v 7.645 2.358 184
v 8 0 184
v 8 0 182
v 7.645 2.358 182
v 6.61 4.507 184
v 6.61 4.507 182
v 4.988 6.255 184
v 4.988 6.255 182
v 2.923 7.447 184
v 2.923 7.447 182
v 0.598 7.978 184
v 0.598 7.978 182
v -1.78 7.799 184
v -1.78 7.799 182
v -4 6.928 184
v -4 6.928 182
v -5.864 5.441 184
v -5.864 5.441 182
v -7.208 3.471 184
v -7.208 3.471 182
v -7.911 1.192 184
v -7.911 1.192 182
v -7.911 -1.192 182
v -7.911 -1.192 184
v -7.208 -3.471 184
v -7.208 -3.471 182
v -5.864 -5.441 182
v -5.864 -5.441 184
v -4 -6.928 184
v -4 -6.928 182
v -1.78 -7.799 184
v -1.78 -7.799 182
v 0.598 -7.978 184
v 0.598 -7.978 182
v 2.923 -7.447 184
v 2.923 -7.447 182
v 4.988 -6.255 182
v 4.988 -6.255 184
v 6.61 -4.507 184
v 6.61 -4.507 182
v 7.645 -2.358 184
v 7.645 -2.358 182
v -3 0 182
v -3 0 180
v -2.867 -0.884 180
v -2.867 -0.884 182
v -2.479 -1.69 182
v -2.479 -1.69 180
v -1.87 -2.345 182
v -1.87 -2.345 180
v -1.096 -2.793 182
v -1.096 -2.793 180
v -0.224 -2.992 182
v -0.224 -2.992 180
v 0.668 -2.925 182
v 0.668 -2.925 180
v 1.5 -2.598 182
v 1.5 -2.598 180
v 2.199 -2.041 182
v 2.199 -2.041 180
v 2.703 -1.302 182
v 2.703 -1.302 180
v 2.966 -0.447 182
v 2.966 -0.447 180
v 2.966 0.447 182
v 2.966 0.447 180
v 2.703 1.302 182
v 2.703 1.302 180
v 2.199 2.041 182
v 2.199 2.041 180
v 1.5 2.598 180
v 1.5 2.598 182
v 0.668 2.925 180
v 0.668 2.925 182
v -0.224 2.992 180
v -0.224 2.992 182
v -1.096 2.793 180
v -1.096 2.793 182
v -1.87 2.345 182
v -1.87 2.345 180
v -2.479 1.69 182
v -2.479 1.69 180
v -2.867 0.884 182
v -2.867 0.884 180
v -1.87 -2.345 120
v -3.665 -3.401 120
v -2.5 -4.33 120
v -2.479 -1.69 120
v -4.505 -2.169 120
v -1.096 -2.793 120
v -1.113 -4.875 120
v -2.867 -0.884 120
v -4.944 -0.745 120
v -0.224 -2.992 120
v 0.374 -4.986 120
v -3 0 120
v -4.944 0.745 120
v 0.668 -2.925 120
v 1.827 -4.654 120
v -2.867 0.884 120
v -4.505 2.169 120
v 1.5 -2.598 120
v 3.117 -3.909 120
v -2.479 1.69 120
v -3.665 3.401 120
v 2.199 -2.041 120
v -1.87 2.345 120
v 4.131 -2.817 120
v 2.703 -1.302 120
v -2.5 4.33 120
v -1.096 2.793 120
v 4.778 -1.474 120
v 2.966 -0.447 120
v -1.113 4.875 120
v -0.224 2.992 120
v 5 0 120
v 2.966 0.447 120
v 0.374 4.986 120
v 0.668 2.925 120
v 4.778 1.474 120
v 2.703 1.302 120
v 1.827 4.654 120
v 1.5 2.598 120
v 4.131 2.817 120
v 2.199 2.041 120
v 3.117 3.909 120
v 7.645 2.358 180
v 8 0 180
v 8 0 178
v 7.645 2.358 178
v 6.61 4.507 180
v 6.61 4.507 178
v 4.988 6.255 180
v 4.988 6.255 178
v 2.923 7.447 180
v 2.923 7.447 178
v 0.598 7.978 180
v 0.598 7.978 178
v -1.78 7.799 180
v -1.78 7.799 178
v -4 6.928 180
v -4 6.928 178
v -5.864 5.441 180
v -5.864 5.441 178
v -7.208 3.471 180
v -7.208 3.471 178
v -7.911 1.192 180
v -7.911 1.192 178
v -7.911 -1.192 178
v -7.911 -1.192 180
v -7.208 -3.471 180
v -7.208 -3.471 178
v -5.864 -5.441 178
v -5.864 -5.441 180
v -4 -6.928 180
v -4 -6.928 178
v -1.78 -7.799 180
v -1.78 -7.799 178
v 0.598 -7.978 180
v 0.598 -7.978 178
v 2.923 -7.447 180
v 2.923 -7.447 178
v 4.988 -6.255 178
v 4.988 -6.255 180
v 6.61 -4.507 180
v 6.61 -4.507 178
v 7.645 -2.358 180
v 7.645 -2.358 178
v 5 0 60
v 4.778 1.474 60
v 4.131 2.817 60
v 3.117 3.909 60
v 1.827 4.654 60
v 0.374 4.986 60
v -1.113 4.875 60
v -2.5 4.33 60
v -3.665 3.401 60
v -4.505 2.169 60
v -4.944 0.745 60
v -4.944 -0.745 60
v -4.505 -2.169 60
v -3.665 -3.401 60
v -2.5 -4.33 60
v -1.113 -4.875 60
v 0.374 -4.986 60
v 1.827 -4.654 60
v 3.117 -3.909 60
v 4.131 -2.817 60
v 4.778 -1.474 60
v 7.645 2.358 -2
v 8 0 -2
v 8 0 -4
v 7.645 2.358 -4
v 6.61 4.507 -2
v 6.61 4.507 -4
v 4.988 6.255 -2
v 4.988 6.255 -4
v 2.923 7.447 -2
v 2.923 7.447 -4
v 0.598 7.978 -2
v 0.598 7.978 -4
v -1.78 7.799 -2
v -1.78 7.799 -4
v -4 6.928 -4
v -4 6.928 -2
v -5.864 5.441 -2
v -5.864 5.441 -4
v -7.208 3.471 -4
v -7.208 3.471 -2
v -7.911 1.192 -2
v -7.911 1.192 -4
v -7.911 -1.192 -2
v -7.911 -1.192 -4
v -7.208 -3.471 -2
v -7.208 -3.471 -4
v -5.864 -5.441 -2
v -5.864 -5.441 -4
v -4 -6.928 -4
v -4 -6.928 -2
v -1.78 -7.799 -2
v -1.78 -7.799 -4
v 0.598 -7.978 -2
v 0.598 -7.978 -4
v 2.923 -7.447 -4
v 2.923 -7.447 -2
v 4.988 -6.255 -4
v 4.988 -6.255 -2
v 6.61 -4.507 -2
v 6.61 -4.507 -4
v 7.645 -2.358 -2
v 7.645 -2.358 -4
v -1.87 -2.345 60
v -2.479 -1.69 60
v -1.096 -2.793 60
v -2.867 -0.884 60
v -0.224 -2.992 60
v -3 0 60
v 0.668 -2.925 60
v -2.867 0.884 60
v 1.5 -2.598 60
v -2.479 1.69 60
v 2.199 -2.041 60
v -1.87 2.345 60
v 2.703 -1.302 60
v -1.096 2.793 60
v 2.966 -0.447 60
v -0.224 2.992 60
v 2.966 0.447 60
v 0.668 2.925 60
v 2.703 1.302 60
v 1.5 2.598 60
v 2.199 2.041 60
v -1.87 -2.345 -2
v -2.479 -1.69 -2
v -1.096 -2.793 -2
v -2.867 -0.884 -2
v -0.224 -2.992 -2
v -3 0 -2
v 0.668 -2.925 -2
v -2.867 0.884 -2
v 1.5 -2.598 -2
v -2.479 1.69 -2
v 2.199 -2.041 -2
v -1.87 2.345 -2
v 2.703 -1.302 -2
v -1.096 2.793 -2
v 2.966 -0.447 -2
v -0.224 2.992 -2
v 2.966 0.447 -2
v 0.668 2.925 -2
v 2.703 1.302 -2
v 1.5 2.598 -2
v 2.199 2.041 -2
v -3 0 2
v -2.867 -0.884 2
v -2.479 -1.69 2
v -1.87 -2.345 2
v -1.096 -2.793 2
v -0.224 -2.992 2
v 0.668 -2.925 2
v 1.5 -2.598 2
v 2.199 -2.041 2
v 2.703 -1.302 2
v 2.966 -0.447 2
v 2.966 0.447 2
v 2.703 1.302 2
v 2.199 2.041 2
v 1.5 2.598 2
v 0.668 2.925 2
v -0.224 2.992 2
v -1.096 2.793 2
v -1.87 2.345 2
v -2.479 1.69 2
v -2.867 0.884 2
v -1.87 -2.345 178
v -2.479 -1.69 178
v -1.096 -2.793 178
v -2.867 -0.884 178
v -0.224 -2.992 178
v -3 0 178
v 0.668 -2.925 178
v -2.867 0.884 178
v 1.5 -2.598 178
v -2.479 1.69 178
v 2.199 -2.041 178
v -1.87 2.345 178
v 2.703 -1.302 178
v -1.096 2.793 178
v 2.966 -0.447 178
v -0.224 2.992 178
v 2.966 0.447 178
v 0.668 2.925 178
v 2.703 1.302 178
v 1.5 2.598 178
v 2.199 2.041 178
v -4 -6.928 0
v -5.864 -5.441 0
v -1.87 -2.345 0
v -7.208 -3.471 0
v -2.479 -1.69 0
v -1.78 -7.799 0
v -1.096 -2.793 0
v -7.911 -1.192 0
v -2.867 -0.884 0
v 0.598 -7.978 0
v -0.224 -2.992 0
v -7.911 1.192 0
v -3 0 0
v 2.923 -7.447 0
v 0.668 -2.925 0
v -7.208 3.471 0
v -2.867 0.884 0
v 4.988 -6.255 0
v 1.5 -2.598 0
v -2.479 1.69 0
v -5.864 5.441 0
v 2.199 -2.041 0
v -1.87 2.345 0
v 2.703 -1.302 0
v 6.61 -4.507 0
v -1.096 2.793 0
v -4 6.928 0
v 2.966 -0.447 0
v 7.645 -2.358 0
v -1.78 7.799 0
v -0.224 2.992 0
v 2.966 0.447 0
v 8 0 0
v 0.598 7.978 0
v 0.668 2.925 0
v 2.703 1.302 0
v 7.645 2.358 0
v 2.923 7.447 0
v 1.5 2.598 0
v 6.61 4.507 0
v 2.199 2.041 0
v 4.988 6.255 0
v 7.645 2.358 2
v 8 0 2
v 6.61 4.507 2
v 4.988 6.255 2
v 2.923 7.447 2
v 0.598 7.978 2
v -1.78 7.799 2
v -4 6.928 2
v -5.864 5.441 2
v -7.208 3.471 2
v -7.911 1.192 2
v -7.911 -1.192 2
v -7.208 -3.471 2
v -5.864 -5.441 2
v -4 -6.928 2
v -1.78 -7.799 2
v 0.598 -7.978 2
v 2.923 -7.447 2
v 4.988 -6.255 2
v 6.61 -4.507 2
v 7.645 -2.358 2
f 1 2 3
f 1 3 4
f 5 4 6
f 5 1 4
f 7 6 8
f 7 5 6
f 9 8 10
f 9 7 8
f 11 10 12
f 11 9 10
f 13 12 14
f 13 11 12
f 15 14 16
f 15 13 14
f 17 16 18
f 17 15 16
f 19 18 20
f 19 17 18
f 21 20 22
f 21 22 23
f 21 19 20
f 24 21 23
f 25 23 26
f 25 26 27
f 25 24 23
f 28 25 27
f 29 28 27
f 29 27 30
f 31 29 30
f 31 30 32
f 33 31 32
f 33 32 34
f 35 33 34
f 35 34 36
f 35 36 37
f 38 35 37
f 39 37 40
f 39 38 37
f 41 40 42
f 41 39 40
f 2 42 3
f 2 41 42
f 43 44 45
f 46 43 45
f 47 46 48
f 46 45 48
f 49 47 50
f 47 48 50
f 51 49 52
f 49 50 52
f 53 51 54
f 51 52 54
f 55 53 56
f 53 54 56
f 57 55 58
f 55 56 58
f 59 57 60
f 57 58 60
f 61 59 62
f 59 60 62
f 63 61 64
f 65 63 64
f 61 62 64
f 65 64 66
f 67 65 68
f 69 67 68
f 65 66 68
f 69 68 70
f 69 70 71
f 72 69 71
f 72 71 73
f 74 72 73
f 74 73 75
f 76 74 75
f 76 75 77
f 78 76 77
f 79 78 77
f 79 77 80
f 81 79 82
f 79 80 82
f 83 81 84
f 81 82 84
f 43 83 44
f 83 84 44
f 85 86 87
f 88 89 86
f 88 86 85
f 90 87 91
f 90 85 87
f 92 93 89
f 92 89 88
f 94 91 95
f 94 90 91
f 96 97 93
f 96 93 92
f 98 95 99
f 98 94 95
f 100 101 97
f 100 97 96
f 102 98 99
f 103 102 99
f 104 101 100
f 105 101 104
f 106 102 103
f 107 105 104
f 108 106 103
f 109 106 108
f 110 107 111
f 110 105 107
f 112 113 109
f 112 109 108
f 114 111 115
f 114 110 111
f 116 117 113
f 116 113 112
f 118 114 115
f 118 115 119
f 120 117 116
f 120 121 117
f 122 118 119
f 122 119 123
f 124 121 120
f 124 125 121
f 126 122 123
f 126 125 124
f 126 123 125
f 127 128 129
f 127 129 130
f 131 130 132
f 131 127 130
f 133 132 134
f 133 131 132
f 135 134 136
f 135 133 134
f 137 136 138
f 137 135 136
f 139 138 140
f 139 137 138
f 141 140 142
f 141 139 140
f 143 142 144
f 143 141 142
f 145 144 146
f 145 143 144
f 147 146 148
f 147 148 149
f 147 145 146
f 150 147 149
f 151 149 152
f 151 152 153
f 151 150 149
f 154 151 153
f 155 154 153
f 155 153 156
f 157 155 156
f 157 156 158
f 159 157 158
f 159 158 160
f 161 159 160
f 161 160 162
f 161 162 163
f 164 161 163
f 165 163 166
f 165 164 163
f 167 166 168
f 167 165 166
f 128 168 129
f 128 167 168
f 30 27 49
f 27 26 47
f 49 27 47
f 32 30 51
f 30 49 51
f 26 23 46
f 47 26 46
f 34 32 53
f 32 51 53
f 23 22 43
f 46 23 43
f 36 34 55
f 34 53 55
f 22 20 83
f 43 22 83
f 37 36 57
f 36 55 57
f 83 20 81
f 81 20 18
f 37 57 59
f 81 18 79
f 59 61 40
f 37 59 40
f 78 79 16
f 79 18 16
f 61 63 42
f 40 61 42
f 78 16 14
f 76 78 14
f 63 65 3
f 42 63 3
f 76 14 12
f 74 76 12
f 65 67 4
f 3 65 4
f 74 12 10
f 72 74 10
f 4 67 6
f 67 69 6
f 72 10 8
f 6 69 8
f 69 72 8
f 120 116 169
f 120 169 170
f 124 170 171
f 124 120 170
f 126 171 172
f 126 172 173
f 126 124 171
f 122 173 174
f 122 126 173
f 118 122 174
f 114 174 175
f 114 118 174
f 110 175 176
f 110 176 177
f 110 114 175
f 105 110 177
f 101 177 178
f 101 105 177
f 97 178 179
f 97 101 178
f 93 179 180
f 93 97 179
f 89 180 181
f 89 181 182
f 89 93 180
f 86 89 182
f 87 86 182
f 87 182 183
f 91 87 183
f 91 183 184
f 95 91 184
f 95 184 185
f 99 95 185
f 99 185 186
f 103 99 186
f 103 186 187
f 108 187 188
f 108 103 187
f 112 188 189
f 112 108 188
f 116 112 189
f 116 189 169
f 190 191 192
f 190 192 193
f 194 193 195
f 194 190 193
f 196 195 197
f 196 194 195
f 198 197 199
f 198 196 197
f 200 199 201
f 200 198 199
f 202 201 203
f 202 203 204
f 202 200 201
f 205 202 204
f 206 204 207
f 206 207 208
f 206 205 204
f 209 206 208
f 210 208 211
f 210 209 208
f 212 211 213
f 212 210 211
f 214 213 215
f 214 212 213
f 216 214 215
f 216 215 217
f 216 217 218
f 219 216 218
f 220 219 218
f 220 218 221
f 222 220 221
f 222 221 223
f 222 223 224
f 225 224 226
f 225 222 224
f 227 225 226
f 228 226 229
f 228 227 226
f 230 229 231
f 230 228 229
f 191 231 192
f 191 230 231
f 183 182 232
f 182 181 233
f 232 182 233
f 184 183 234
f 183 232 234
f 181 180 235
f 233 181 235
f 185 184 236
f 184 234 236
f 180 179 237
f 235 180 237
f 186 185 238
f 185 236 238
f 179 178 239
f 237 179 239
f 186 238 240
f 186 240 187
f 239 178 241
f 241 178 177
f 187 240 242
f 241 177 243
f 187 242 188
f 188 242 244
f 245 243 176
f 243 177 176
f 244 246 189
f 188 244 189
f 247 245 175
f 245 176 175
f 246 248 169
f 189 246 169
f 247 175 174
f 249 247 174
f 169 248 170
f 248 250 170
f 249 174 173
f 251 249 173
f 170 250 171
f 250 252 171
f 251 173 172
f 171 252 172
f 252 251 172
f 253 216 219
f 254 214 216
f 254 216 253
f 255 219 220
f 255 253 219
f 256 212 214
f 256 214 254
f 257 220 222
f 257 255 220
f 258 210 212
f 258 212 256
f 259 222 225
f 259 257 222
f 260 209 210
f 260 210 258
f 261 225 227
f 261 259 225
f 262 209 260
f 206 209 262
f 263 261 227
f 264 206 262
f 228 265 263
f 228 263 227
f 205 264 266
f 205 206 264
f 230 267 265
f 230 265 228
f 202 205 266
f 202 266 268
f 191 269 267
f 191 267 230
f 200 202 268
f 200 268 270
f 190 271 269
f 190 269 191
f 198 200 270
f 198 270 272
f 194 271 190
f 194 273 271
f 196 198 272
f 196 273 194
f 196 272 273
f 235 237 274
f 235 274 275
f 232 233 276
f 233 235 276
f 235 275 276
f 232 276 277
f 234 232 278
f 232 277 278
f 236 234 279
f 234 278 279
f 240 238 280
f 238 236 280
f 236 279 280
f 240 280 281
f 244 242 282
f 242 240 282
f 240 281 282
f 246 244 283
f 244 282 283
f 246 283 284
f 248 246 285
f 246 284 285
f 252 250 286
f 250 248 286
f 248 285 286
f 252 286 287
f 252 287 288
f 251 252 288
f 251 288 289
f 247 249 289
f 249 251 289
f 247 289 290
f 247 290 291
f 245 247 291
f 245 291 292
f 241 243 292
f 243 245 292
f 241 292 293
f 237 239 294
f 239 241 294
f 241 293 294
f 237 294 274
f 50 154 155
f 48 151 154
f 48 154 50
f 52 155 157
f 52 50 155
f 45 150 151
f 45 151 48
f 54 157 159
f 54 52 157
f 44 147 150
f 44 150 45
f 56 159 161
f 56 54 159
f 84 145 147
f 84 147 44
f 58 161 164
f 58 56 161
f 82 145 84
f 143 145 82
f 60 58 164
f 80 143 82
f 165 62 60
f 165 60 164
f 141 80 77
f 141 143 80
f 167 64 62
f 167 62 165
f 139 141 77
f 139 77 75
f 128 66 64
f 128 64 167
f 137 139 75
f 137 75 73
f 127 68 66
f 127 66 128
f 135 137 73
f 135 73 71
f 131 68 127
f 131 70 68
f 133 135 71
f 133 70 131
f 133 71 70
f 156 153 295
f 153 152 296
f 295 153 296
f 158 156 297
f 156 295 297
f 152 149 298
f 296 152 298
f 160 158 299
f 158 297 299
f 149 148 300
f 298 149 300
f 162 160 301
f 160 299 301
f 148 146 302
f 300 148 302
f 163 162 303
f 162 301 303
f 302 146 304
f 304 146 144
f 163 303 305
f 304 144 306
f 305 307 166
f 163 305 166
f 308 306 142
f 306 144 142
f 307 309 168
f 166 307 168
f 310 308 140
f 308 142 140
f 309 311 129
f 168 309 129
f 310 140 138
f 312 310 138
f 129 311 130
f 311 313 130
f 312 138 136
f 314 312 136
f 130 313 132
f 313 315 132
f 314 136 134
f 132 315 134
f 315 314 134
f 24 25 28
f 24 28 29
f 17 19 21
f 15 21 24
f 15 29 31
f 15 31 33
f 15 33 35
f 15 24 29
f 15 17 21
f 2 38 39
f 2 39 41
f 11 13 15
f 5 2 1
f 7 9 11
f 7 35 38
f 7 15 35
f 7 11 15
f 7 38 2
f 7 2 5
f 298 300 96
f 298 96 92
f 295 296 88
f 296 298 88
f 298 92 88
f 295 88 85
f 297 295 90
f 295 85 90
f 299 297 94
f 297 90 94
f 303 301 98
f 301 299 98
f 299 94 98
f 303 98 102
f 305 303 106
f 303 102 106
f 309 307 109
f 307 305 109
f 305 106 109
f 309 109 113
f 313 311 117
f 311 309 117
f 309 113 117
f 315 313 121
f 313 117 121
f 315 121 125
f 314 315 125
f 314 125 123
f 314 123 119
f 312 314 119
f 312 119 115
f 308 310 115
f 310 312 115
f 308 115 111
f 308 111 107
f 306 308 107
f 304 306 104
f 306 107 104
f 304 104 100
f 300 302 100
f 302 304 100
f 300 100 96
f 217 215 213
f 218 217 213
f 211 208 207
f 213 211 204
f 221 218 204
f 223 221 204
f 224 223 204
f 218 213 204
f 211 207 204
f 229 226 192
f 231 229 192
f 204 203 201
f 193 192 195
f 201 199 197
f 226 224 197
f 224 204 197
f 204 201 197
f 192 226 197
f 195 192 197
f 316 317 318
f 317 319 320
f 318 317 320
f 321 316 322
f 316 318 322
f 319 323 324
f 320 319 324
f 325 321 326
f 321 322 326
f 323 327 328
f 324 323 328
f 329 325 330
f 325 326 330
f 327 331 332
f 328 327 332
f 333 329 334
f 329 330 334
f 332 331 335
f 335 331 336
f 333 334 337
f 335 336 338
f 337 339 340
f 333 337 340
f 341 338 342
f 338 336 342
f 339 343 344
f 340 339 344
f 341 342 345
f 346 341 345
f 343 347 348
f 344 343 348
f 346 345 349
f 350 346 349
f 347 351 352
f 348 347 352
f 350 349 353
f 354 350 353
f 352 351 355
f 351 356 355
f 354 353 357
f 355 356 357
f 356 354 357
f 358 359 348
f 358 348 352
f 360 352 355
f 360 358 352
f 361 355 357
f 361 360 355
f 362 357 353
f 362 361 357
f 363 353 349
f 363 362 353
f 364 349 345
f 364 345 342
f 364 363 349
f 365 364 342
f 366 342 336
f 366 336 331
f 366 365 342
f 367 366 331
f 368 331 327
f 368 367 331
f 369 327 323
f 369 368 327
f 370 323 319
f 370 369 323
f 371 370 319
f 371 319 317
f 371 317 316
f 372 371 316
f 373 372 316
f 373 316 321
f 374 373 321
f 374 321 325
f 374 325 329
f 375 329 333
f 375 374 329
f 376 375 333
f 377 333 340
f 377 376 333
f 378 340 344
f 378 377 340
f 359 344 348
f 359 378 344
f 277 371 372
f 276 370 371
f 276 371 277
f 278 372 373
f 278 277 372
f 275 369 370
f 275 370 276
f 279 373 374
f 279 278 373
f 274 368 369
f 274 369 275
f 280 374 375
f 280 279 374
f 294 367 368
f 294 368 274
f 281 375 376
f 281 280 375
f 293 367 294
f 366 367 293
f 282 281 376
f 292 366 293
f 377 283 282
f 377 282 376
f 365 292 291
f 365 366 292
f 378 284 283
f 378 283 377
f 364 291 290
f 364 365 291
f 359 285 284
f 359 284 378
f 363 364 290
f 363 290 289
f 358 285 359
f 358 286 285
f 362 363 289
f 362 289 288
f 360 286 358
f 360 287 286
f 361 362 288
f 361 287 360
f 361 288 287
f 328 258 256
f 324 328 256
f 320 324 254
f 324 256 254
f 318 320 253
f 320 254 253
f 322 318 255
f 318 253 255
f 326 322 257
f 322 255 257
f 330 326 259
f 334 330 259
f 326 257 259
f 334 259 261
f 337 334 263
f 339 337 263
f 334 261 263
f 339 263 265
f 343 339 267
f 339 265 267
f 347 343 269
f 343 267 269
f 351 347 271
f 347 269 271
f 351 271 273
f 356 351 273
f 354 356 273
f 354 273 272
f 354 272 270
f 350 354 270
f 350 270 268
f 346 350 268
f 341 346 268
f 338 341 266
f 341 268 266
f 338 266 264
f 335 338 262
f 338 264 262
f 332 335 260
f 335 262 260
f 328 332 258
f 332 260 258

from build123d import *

# Parameters (mm, degrees)
SKETCH_1_R       = 3
EXTRUDE_1_DEPTH  = 180
SKETCH_2_R       = 8
EXTRUDE_2_DEPTH  = 2
EXTRUDE_START    = -178
SKETCH_2_2_R     = 8
EXTRUDE_3_DEPTH  = 2
EXTRUDE_START_2  = -2
SKETCH_1_2_R     = 3
EXTRUDE_4_DEPTH  = 2
EXTRUDE_START_3  = 180
SKETCH_1_3_R     = 3
EXTRUDE_5_DEPTH  = 2
EXTRUDE_START_4  = 4
SKETCH_2_3_R     = 8
EXTRUDE_6_DEPTH  = 2
EXTRUDE_START_5  = -182
SKETCH_2_4_R     = 8
EXTRUDE_7_DEPTH  = 2
EXTRUDE_START_6  = -64
SKETCH_3_R       = 5
EXTRUDE_10_DEPTH = 60


with BuildPart() as part:
    # 草图1 → 凸台-拉伸1 (new body)
    with BuildSketch(Plane.XY):
        with Locations(Location((0, 0, 0), (0, 0, 180))):
            Circle(SKETCH_1_R)
    extrude(amount=EXTRUDE_1_DEPTH)

    # 草图2 → 凸台-拉伸2 (add)
    with BuildSketch(Plane.XY.offset(180)):
        Circle(SKETCH_2_R)
    extrude(amount=-EXTRUDE_2_DEPTH)

    # 草图2<2> → 凸台-拉伸3 (add)
    with BuildSketch(Plane.XY.offset(180).offset(EXTRUDE_START)):
        Circle(SKETCH_2_2_R)
    extrude(amount=-EXTRUDE_3_DEPTH)

    # 草图1<2> → 凸台-拉伸4 (add)
    with BuildSketch(Plane.XY.offset(EXTRUDE_START_2)):
        with Locations(Location((0, 0, 0), (0, 0, 180))):
            Circle(SKETCH_1_2_R)
    extrude(amount=EXTRUDE_4_DEPTH)

    # 草图1<3> → 凸台-拉伸5 (add)
    with BuildSketch(Plane.XY.offset(EXTRUDE_START_3)):
        with Locations(Location((0, 0, 0), (0, 0, 180))):
            Circle(SKETCH_1_3_R)
    extrude(amount=EXTRUDE_5_DEPTH)

    # 草图2<3> → 凸台-拉伸6 (add)
    with BuildSketch(Plane.XY.offset(180).offset(EXTRUDE_START_4)):
        Circle(SKETCH_2_3_R)
    extrude(amount=-EXTRUDE_6_DEPTH)

    # 草图2<4> → 凸台-拉伸7 (add)
    with BuildSketch(Plane.XY.offset(180).offset(EXTRUDE_START_5)):
        Circle(SKETCH_2_4_R)
    extrude(amount=-EXTRUDE_7_DEPTH)

    # 草图3 → 凸台-拉伸10 (add)
    with BuildSketch(Plane.XY.offset(184).offset(EXTRUDE_START_6)):
        Circle(SKETCH_3_R)
    extrude(amount=-EXTRUDE_10_DEPTH)


solid = part.part
